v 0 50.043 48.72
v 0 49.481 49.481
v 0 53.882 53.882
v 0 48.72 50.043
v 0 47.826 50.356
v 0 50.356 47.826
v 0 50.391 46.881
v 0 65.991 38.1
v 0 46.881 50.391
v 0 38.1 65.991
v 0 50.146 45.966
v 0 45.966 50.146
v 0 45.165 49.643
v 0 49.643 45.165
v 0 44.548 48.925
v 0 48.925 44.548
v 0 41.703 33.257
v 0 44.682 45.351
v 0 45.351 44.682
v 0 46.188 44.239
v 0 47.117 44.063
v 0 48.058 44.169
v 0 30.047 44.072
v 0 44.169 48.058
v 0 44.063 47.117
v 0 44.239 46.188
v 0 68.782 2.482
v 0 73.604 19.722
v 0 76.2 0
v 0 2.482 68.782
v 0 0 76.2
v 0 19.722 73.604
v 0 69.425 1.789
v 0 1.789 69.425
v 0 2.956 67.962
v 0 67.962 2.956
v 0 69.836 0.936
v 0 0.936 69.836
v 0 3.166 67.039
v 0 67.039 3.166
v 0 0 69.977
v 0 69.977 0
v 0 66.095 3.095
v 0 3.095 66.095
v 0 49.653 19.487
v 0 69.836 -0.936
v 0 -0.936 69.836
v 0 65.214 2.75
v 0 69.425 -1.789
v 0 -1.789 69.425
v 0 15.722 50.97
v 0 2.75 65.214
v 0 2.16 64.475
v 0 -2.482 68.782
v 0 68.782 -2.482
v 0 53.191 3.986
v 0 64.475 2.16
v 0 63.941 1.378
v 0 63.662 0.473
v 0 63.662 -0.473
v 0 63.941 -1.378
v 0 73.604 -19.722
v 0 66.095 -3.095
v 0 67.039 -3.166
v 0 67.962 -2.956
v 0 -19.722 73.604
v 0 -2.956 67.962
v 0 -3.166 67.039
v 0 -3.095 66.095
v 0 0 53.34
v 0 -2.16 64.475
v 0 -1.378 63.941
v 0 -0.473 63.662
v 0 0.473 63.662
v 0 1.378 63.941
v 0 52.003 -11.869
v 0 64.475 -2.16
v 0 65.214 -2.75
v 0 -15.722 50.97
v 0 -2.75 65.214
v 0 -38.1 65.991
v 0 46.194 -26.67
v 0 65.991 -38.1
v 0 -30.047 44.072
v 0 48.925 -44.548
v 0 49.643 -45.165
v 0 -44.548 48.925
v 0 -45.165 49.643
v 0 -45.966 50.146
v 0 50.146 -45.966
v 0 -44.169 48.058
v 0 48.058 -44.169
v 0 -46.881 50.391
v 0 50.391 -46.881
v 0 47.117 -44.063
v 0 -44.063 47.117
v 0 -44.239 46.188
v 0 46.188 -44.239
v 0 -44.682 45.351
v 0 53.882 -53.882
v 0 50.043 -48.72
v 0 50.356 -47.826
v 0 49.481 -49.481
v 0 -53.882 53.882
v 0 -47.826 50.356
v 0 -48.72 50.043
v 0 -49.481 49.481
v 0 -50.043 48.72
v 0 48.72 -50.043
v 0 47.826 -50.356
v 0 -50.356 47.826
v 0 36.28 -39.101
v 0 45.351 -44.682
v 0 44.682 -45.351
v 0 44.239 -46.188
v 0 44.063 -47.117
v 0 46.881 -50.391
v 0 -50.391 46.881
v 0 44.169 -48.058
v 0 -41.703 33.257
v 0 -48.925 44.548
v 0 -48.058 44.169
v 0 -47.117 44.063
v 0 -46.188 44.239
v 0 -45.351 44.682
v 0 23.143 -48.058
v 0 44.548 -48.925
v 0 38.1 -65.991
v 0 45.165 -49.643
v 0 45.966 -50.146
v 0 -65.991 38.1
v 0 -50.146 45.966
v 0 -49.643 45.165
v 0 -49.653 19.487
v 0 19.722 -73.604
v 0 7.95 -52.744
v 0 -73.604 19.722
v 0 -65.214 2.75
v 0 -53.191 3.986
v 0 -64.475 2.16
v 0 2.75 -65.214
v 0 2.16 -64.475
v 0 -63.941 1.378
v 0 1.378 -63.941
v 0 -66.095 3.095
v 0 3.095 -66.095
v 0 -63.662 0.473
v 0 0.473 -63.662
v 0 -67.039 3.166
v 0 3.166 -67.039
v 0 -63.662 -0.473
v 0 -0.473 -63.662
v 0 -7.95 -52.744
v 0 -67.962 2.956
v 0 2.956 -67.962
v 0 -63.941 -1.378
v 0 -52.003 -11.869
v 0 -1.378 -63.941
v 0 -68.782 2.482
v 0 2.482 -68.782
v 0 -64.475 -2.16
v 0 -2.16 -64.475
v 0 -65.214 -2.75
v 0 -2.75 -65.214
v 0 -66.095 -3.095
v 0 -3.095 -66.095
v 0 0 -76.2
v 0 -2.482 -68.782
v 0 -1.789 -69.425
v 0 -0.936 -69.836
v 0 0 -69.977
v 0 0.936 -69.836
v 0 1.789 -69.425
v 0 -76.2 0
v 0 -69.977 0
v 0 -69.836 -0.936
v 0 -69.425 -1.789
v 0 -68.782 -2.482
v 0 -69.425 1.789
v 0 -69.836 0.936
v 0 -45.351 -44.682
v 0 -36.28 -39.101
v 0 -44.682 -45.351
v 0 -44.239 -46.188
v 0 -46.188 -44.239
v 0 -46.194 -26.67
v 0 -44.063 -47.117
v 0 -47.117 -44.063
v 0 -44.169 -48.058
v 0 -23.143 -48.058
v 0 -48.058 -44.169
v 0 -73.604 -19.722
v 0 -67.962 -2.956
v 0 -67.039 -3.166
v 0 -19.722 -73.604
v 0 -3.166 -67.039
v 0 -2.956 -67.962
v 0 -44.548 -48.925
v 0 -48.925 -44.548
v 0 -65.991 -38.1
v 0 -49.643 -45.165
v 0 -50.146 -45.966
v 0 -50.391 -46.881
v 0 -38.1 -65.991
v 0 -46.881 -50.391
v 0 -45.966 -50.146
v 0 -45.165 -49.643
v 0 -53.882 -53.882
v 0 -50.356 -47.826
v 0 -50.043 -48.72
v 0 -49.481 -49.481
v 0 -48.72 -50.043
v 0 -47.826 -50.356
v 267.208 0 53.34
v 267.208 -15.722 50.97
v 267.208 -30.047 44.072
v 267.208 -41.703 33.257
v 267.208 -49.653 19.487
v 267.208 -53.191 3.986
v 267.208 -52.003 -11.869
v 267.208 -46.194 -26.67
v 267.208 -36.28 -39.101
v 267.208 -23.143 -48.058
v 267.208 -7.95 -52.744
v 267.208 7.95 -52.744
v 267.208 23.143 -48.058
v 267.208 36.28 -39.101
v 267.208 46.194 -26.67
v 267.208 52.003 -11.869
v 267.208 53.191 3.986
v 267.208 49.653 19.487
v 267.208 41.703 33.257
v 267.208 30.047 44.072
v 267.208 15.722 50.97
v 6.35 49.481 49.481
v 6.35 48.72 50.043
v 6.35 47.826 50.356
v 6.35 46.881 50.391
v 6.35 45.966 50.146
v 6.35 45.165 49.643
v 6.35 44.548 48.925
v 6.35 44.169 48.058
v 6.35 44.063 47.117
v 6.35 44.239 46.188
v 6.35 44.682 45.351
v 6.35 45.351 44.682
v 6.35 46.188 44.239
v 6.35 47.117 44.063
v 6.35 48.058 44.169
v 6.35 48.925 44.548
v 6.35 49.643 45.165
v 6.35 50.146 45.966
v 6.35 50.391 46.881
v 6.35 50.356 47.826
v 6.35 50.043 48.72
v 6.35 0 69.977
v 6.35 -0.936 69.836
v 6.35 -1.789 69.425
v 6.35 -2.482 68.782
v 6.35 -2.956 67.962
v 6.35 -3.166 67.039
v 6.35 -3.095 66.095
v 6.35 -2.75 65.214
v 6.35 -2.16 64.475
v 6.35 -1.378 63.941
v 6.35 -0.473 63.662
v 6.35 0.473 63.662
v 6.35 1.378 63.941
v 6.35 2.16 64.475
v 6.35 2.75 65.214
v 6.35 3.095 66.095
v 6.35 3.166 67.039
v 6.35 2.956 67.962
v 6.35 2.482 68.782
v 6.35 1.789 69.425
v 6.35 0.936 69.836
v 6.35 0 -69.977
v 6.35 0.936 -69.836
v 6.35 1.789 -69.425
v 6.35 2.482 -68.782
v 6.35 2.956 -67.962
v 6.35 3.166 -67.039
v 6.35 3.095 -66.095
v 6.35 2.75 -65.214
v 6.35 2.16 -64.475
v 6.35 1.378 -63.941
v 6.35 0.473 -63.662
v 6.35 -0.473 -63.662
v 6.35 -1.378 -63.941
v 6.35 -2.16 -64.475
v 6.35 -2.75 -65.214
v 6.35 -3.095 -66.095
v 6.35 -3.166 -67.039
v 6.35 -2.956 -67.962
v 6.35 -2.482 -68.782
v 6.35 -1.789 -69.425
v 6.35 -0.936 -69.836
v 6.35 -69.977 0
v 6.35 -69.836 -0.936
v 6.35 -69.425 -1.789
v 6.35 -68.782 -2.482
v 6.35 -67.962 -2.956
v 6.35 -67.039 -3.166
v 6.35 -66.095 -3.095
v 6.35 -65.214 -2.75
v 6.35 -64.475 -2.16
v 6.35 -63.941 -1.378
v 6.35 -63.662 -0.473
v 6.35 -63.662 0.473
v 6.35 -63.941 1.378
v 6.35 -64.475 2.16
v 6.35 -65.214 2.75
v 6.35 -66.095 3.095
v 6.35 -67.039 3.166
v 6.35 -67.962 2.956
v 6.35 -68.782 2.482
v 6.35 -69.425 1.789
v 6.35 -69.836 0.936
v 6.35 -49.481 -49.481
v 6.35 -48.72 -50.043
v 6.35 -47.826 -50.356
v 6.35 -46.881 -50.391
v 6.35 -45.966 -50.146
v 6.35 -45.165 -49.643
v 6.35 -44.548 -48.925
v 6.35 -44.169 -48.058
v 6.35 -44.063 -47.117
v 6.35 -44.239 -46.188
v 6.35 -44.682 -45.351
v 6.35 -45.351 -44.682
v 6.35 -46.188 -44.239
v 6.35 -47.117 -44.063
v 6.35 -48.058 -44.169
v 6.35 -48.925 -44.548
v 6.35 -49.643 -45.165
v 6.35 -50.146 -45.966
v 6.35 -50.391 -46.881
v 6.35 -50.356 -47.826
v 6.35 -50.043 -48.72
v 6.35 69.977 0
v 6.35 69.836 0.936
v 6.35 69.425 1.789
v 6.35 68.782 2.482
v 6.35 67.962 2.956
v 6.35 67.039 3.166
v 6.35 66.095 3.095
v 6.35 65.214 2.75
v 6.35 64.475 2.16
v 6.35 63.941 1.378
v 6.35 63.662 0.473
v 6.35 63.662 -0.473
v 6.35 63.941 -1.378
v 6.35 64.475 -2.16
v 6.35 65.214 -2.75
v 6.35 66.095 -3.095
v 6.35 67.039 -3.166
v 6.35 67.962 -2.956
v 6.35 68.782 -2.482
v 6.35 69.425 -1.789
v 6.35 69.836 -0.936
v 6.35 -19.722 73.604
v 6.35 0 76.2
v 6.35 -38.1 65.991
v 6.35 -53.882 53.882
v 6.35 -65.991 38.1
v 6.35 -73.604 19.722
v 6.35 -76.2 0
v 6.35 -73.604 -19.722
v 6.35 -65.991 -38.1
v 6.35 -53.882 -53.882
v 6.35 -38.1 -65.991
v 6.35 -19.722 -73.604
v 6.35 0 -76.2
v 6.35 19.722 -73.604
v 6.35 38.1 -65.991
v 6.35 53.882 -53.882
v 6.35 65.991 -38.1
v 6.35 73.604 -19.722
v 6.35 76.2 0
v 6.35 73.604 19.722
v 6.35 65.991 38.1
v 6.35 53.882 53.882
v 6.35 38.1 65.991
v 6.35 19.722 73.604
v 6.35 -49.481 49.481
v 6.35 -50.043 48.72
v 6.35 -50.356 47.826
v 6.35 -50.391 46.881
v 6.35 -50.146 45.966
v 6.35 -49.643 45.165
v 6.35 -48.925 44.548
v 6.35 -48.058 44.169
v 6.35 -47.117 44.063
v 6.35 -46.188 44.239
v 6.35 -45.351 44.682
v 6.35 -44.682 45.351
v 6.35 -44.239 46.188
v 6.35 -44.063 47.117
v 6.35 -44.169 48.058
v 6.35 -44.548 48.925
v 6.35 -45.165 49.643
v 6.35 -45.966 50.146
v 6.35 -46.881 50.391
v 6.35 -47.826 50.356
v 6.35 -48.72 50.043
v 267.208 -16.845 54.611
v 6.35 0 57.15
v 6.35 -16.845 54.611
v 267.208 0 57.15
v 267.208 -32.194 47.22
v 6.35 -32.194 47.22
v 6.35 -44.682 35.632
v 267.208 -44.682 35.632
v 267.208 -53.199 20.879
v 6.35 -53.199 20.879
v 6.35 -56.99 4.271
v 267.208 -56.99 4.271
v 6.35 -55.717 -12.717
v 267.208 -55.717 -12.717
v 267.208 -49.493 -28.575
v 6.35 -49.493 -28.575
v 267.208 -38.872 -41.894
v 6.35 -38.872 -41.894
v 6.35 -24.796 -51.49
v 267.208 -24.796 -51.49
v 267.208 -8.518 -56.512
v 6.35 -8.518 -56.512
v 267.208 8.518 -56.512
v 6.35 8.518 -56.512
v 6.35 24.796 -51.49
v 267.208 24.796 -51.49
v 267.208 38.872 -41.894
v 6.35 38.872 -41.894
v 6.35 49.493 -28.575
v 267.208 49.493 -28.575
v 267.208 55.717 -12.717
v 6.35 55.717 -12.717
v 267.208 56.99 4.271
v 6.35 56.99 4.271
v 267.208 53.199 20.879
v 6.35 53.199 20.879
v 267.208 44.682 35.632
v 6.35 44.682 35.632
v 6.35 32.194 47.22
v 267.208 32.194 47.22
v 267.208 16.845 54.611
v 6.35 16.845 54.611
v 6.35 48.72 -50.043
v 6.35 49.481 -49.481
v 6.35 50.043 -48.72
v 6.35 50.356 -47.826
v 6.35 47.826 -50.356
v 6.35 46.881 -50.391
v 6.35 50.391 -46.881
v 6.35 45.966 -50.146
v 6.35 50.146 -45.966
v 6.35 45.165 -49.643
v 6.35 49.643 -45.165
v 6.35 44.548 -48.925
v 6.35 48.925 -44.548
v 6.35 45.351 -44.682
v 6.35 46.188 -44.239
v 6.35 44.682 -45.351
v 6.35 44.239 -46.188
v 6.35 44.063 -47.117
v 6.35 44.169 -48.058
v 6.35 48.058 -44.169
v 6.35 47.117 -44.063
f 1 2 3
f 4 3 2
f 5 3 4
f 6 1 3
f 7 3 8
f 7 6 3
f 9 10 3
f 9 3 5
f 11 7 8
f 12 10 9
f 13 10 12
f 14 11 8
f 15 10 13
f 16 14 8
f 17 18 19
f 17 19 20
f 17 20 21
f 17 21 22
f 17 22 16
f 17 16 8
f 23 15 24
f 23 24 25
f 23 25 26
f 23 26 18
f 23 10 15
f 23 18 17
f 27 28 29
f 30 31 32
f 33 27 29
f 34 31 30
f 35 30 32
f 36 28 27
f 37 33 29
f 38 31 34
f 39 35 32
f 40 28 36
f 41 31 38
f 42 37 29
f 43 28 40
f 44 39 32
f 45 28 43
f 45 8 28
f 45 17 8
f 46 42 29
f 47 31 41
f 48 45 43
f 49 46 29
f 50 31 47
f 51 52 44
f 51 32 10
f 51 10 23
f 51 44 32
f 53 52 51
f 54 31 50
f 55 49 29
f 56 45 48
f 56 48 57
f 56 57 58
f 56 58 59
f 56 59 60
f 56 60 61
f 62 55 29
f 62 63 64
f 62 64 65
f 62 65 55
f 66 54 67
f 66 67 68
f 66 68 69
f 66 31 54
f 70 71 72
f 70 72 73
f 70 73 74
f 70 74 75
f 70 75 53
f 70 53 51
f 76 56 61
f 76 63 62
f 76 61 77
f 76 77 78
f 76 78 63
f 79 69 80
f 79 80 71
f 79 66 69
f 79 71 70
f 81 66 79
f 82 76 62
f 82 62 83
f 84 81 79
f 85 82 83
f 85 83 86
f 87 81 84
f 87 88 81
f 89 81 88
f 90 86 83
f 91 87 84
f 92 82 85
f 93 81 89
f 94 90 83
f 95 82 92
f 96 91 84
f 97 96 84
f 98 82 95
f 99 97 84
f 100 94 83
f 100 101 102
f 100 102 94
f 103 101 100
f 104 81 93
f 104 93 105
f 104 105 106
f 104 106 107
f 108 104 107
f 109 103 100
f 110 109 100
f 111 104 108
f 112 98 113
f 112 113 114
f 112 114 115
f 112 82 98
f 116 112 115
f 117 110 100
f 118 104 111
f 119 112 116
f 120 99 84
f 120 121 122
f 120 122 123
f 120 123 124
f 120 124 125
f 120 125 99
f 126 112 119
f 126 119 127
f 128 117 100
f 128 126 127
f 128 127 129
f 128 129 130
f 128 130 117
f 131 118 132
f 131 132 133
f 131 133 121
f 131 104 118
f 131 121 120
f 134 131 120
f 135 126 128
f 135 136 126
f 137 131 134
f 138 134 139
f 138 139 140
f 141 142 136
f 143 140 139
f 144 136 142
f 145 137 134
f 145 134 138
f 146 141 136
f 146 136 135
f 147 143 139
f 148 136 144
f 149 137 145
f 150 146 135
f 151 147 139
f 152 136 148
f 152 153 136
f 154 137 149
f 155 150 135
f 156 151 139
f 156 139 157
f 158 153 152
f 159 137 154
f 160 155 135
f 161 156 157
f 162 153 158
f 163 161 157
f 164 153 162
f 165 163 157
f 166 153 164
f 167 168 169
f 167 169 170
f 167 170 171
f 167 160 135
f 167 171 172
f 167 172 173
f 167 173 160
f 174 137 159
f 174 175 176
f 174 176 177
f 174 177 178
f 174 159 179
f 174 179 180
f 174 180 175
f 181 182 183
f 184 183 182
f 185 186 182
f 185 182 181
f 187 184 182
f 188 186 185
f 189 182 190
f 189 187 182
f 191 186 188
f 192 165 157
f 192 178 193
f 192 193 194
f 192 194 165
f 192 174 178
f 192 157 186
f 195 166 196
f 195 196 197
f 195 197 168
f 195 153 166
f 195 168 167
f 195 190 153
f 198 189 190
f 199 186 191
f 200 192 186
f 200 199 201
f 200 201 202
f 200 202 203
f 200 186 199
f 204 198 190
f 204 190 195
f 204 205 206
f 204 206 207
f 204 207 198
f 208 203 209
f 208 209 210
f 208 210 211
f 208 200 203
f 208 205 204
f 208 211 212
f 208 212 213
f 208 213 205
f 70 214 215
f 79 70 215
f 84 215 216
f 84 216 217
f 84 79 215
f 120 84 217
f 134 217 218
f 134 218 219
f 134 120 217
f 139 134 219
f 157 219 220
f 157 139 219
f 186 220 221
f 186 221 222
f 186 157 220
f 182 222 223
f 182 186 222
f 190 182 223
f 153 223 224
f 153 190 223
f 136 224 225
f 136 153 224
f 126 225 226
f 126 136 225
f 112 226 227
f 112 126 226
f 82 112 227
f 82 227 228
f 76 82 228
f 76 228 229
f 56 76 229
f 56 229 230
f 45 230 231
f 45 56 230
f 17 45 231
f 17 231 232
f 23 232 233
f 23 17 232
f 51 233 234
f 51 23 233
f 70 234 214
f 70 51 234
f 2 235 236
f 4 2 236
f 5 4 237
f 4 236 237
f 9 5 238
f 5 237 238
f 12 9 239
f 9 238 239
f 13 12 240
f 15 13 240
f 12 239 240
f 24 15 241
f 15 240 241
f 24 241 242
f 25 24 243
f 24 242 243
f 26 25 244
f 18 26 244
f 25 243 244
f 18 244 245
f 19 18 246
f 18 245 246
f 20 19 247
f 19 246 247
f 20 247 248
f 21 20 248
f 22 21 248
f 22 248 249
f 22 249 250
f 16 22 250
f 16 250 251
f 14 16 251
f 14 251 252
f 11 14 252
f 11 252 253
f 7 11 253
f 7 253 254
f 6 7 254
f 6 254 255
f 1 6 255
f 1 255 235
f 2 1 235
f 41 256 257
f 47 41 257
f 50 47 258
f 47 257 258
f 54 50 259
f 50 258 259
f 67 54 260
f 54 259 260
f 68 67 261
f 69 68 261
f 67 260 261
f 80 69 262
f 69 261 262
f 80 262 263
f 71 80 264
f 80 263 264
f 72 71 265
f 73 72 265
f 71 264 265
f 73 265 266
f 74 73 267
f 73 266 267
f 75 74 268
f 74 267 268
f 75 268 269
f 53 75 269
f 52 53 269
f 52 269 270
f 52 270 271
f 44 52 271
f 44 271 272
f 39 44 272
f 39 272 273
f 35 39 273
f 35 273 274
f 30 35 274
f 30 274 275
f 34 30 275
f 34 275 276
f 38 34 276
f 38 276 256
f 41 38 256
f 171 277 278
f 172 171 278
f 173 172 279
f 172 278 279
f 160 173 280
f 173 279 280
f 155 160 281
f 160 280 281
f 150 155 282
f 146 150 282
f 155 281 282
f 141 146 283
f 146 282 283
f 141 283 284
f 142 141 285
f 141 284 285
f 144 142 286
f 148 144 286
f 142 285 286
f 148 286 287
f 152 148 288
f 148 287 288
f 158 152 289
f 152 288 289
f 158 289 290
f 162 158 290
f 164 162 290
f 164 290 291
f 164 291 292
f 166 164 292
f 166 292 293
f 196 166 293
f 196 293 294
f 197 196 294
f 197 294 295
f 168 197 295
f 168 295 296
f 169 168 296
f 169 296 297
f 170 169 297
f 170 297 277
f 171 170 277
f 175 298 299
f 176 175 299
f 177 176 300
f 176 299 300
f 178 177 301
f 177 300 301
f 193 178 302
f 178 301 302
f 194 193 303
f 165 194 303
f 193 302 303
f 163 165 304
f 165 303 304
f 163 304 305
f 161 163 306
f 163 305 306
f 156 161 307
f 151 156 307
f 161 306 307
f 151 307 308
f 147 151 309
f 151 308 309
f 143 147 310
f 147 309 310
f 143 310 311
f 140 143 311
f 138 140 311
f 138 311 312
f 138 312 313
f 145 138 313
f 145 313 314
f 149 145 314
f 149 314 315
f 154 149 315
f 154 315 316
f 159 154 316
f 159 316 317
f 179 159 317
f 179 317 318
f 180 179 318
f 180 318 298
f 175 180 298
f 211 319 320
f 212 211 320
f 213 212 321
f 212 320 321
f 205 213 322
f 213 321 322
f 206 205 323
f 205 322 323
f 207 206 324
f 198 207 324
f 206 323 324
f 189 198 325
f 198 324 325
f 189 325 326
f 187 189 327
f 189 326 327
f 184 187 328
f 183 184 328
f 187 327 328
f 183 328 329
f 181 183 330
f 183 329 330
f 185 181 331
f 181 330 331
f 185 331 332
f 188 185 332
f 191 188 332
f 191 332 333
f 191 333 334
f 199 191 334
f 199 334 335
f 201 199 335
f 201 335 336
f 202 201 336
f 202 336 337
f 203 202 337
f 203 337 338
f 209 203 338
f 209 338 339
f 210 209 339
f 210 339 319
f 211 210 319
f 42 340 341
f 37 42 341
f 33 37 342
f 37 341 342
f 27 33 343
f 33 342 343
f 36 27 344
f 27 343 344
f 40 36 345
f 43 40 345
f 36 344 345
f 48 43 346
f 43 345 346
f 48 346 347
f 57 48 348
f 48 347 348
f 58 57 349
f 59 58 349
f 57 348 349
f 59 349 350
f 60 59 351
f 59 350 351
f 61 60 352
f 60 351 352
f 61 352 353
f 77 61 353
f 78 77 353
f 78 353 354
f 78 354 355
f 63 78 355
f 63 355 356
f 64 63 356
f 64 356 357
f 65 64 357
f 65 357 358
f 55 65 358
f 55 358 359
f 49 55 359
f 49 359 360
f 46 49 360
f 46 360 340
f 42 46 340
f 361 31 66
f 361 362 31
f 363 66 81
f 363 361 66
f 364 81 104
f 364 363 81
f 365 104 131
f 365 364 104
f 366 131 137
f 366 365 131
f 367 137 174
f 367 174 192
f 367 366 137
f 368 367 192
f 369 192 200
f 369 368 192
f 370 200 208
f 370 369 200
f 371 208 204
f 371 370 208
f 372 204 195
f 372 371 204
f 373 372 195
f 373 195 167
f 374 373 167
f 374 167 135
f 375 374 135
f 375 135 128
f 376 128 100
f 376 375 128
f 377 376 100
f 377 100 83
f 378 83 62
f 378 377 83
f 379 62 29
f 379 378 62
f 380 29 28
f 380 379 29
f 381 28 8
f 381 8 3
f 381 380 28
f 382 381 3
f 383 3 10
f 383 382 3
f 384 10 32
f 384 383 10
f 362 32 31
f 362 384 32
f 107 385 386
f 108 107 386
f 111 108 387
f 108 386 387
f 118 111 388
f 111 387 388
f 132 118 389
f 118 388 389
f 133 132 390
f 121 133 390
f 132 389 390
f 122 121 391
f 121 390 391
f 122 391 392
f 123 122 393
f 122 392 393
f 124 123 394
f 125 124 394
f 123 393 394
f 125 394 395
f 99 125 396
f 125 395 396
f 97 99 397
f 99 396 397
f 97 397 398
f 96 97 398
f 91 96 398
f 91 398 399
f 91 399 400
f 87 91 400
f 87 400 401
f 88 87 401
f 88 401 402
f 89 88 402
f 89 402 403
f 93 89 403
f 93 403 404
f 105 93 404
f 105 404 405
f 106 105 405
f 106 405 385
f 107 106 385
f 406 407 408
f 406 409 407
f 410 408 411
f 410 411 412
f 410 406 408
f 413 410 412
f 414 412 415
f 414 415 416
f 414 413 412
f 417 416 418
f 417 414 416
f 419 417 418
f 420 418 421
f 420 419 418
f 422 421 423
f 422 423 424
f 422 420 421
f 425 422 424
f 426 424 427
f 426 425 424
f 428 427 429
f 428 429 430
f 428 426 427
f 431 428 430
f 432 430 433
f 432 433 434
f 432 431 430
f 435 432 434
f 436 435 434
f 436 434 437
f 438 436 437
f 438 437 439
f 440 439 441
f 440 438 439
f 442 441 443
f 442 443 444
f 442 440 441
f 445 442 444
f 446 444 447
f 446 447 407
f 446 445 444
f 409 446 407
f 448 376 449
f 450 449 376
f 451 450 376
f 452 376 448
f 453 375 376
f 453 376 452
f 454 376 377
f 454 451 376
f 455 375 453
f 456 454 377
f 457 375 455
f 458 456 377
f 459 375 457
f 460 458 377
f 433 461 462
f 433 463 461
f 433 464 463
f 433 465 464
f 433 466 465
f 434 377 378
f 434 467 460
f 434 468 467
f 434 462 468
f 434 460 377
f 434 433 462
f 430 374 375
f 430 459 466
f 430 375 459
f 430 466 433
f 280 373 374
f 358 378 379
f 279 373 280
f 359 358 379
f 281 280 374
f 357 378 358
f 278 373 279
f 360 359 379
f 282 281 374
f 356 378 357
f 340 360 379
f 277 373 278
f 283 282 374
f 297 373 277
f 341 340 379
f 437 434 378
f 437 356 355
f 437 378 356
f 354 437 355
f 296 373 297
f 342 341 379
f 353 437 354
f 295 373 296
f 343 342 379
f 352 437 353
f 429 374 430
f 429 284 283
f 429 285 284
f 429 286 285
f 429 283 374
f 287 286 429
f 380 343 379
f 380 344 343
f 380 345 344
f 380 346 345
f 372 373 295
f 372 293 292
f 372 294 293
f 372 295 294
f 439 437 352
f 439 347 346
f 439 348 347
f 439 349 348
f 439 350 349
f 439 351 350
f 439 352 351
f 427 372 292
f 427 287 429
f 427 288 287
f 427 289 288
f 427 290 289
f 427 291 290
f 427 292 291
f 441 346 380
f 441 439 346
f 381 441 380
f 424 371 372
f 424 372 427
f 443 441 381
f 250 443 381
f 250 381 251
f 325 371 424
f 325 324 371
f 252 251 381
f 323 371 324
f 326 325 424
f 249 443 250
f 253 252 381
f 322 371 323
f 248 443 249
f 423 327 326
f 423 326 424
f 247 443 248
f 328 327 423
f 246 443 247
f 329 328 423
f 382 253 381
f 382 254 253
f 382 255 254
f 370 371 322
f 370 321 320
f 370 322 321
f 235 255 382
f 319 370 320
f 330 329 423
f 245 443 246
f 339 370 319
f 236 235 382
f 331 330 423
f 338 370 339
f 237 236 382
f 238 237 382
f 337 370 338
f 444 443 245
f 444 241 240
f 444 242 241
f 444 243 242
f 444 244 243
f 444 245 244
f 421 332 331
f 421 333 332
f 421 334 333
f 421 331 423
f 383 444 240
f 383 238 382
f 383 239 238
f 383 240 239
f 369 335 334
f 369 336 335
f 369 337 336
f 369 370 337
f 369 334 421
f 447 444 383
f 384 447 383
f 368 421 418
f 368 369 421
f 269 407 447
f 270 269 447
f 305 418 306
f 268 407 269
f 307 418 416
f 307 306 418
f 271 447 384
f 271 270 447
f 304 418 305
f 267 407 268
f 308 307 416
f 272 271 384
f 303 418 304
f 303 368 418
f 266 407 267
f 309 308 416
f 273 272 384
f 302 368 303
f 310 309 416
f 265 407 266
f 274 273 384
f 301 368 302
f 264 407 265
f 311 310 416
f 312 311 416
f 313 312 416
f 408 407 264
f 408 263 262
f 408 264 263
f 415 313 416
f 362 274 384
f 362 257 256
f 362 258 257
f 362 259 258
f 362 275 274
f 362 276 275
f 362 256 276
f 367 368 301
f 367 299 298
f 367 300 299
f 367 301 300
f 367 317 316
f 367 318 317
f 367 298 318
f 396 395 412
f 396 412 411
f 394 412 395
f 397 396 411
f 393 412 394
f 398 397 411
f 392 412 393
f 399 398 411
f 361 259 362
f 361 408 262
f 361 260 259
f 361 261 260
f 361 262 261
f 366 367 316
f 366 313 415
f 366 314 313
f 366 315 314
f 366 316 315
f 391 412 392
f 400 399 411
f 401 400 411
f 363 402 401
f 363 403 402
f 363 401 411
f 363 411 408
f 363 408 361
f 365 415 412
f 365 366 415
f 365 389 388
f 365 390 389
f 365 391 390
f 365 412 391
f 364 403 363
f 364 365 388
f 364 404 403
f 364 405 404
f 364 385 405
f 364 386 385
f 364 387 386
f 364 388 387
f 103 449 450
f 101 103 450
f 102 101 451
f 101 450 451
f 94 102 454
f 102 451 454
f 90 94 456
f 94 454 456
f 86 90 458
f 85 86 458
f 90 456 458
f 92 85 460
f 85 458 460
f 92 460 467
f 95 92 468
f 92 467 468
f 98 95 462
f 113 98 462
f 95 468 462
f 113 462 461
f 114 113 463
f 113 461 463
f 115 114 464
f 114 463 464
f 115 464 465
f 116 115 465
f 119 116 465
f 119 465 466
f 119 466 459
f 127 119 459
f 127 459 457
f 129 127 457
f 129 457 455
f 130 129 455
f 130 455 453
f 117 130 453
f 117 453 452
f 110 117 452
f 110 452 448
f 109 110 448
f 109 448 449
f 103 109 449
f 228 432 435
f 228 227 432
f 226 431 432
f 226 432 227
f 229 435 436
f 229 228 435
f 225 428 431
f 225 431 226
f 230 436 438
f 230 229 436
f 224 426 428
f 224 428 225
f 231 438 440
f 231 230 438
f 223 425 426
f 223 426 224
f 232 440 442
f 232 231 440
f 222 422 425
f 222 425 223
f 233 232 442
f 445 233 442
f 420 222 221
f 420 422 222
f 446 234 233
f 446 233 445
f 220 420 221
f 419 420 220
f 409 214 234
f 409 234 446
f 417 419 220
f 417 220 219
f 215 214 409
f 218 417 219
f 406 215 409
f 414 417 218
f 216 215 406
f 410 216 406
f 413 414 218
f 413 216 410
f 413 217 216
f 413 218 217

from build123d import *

# Parameters (mm, degrees)
SKETCH2_R          = 3.175
CUT_EXTRUDE1_DEPTH = 283.24063521
CIRPATTERN1_COUNT  = 8


with BuildPart() as part:
    # Sketch1 → Revolve1 (revolve)
    with BuildSketch(Plane.XY, mode=Mode.PRIVATE) as revolve1_sk:
        Polygon((0, 76.2), (6.35, 76.2), (6.35, 57.15), (267.208, 57.15), (267.208, 53.34), (0, 53.34), align=None)
    revolve(revolve1_sk.sketch.rotate(Axis((0, 0, 0), (1, 0, 0)), 90), axis=Axis((0, 0, 0), (1, 0, 0)))

    # Sketch2 → Cut-Extrude1 (cut, through all)
    with BuildSketch(Plane(origin=(6.35, 0, 0), x_dir=(0, 0, -1), z_dir=(1, 0, 0))):
        with Locations((66.802, 0)):
            Circle(SKETCH2_R)
    cut_extrude1 = extrude(amount=-CUT_EXTRUDE1_DEPTH, mode=Mode.SUBTRACT)

    # CirPattern1: Cut-Extrude1 ×8 about axis
    cirpattern1_axis = Axis((0, 0, 0), (1, 0, 0))
    for i in range(1, CIRPATTERN1_COUNT):
        add(cut_extrude1.rotate(cirpattern1_axis, i * 360 / CIRPATTERN1_COUNT), mode=Mode.SUBTRACT)


solid = part.part
